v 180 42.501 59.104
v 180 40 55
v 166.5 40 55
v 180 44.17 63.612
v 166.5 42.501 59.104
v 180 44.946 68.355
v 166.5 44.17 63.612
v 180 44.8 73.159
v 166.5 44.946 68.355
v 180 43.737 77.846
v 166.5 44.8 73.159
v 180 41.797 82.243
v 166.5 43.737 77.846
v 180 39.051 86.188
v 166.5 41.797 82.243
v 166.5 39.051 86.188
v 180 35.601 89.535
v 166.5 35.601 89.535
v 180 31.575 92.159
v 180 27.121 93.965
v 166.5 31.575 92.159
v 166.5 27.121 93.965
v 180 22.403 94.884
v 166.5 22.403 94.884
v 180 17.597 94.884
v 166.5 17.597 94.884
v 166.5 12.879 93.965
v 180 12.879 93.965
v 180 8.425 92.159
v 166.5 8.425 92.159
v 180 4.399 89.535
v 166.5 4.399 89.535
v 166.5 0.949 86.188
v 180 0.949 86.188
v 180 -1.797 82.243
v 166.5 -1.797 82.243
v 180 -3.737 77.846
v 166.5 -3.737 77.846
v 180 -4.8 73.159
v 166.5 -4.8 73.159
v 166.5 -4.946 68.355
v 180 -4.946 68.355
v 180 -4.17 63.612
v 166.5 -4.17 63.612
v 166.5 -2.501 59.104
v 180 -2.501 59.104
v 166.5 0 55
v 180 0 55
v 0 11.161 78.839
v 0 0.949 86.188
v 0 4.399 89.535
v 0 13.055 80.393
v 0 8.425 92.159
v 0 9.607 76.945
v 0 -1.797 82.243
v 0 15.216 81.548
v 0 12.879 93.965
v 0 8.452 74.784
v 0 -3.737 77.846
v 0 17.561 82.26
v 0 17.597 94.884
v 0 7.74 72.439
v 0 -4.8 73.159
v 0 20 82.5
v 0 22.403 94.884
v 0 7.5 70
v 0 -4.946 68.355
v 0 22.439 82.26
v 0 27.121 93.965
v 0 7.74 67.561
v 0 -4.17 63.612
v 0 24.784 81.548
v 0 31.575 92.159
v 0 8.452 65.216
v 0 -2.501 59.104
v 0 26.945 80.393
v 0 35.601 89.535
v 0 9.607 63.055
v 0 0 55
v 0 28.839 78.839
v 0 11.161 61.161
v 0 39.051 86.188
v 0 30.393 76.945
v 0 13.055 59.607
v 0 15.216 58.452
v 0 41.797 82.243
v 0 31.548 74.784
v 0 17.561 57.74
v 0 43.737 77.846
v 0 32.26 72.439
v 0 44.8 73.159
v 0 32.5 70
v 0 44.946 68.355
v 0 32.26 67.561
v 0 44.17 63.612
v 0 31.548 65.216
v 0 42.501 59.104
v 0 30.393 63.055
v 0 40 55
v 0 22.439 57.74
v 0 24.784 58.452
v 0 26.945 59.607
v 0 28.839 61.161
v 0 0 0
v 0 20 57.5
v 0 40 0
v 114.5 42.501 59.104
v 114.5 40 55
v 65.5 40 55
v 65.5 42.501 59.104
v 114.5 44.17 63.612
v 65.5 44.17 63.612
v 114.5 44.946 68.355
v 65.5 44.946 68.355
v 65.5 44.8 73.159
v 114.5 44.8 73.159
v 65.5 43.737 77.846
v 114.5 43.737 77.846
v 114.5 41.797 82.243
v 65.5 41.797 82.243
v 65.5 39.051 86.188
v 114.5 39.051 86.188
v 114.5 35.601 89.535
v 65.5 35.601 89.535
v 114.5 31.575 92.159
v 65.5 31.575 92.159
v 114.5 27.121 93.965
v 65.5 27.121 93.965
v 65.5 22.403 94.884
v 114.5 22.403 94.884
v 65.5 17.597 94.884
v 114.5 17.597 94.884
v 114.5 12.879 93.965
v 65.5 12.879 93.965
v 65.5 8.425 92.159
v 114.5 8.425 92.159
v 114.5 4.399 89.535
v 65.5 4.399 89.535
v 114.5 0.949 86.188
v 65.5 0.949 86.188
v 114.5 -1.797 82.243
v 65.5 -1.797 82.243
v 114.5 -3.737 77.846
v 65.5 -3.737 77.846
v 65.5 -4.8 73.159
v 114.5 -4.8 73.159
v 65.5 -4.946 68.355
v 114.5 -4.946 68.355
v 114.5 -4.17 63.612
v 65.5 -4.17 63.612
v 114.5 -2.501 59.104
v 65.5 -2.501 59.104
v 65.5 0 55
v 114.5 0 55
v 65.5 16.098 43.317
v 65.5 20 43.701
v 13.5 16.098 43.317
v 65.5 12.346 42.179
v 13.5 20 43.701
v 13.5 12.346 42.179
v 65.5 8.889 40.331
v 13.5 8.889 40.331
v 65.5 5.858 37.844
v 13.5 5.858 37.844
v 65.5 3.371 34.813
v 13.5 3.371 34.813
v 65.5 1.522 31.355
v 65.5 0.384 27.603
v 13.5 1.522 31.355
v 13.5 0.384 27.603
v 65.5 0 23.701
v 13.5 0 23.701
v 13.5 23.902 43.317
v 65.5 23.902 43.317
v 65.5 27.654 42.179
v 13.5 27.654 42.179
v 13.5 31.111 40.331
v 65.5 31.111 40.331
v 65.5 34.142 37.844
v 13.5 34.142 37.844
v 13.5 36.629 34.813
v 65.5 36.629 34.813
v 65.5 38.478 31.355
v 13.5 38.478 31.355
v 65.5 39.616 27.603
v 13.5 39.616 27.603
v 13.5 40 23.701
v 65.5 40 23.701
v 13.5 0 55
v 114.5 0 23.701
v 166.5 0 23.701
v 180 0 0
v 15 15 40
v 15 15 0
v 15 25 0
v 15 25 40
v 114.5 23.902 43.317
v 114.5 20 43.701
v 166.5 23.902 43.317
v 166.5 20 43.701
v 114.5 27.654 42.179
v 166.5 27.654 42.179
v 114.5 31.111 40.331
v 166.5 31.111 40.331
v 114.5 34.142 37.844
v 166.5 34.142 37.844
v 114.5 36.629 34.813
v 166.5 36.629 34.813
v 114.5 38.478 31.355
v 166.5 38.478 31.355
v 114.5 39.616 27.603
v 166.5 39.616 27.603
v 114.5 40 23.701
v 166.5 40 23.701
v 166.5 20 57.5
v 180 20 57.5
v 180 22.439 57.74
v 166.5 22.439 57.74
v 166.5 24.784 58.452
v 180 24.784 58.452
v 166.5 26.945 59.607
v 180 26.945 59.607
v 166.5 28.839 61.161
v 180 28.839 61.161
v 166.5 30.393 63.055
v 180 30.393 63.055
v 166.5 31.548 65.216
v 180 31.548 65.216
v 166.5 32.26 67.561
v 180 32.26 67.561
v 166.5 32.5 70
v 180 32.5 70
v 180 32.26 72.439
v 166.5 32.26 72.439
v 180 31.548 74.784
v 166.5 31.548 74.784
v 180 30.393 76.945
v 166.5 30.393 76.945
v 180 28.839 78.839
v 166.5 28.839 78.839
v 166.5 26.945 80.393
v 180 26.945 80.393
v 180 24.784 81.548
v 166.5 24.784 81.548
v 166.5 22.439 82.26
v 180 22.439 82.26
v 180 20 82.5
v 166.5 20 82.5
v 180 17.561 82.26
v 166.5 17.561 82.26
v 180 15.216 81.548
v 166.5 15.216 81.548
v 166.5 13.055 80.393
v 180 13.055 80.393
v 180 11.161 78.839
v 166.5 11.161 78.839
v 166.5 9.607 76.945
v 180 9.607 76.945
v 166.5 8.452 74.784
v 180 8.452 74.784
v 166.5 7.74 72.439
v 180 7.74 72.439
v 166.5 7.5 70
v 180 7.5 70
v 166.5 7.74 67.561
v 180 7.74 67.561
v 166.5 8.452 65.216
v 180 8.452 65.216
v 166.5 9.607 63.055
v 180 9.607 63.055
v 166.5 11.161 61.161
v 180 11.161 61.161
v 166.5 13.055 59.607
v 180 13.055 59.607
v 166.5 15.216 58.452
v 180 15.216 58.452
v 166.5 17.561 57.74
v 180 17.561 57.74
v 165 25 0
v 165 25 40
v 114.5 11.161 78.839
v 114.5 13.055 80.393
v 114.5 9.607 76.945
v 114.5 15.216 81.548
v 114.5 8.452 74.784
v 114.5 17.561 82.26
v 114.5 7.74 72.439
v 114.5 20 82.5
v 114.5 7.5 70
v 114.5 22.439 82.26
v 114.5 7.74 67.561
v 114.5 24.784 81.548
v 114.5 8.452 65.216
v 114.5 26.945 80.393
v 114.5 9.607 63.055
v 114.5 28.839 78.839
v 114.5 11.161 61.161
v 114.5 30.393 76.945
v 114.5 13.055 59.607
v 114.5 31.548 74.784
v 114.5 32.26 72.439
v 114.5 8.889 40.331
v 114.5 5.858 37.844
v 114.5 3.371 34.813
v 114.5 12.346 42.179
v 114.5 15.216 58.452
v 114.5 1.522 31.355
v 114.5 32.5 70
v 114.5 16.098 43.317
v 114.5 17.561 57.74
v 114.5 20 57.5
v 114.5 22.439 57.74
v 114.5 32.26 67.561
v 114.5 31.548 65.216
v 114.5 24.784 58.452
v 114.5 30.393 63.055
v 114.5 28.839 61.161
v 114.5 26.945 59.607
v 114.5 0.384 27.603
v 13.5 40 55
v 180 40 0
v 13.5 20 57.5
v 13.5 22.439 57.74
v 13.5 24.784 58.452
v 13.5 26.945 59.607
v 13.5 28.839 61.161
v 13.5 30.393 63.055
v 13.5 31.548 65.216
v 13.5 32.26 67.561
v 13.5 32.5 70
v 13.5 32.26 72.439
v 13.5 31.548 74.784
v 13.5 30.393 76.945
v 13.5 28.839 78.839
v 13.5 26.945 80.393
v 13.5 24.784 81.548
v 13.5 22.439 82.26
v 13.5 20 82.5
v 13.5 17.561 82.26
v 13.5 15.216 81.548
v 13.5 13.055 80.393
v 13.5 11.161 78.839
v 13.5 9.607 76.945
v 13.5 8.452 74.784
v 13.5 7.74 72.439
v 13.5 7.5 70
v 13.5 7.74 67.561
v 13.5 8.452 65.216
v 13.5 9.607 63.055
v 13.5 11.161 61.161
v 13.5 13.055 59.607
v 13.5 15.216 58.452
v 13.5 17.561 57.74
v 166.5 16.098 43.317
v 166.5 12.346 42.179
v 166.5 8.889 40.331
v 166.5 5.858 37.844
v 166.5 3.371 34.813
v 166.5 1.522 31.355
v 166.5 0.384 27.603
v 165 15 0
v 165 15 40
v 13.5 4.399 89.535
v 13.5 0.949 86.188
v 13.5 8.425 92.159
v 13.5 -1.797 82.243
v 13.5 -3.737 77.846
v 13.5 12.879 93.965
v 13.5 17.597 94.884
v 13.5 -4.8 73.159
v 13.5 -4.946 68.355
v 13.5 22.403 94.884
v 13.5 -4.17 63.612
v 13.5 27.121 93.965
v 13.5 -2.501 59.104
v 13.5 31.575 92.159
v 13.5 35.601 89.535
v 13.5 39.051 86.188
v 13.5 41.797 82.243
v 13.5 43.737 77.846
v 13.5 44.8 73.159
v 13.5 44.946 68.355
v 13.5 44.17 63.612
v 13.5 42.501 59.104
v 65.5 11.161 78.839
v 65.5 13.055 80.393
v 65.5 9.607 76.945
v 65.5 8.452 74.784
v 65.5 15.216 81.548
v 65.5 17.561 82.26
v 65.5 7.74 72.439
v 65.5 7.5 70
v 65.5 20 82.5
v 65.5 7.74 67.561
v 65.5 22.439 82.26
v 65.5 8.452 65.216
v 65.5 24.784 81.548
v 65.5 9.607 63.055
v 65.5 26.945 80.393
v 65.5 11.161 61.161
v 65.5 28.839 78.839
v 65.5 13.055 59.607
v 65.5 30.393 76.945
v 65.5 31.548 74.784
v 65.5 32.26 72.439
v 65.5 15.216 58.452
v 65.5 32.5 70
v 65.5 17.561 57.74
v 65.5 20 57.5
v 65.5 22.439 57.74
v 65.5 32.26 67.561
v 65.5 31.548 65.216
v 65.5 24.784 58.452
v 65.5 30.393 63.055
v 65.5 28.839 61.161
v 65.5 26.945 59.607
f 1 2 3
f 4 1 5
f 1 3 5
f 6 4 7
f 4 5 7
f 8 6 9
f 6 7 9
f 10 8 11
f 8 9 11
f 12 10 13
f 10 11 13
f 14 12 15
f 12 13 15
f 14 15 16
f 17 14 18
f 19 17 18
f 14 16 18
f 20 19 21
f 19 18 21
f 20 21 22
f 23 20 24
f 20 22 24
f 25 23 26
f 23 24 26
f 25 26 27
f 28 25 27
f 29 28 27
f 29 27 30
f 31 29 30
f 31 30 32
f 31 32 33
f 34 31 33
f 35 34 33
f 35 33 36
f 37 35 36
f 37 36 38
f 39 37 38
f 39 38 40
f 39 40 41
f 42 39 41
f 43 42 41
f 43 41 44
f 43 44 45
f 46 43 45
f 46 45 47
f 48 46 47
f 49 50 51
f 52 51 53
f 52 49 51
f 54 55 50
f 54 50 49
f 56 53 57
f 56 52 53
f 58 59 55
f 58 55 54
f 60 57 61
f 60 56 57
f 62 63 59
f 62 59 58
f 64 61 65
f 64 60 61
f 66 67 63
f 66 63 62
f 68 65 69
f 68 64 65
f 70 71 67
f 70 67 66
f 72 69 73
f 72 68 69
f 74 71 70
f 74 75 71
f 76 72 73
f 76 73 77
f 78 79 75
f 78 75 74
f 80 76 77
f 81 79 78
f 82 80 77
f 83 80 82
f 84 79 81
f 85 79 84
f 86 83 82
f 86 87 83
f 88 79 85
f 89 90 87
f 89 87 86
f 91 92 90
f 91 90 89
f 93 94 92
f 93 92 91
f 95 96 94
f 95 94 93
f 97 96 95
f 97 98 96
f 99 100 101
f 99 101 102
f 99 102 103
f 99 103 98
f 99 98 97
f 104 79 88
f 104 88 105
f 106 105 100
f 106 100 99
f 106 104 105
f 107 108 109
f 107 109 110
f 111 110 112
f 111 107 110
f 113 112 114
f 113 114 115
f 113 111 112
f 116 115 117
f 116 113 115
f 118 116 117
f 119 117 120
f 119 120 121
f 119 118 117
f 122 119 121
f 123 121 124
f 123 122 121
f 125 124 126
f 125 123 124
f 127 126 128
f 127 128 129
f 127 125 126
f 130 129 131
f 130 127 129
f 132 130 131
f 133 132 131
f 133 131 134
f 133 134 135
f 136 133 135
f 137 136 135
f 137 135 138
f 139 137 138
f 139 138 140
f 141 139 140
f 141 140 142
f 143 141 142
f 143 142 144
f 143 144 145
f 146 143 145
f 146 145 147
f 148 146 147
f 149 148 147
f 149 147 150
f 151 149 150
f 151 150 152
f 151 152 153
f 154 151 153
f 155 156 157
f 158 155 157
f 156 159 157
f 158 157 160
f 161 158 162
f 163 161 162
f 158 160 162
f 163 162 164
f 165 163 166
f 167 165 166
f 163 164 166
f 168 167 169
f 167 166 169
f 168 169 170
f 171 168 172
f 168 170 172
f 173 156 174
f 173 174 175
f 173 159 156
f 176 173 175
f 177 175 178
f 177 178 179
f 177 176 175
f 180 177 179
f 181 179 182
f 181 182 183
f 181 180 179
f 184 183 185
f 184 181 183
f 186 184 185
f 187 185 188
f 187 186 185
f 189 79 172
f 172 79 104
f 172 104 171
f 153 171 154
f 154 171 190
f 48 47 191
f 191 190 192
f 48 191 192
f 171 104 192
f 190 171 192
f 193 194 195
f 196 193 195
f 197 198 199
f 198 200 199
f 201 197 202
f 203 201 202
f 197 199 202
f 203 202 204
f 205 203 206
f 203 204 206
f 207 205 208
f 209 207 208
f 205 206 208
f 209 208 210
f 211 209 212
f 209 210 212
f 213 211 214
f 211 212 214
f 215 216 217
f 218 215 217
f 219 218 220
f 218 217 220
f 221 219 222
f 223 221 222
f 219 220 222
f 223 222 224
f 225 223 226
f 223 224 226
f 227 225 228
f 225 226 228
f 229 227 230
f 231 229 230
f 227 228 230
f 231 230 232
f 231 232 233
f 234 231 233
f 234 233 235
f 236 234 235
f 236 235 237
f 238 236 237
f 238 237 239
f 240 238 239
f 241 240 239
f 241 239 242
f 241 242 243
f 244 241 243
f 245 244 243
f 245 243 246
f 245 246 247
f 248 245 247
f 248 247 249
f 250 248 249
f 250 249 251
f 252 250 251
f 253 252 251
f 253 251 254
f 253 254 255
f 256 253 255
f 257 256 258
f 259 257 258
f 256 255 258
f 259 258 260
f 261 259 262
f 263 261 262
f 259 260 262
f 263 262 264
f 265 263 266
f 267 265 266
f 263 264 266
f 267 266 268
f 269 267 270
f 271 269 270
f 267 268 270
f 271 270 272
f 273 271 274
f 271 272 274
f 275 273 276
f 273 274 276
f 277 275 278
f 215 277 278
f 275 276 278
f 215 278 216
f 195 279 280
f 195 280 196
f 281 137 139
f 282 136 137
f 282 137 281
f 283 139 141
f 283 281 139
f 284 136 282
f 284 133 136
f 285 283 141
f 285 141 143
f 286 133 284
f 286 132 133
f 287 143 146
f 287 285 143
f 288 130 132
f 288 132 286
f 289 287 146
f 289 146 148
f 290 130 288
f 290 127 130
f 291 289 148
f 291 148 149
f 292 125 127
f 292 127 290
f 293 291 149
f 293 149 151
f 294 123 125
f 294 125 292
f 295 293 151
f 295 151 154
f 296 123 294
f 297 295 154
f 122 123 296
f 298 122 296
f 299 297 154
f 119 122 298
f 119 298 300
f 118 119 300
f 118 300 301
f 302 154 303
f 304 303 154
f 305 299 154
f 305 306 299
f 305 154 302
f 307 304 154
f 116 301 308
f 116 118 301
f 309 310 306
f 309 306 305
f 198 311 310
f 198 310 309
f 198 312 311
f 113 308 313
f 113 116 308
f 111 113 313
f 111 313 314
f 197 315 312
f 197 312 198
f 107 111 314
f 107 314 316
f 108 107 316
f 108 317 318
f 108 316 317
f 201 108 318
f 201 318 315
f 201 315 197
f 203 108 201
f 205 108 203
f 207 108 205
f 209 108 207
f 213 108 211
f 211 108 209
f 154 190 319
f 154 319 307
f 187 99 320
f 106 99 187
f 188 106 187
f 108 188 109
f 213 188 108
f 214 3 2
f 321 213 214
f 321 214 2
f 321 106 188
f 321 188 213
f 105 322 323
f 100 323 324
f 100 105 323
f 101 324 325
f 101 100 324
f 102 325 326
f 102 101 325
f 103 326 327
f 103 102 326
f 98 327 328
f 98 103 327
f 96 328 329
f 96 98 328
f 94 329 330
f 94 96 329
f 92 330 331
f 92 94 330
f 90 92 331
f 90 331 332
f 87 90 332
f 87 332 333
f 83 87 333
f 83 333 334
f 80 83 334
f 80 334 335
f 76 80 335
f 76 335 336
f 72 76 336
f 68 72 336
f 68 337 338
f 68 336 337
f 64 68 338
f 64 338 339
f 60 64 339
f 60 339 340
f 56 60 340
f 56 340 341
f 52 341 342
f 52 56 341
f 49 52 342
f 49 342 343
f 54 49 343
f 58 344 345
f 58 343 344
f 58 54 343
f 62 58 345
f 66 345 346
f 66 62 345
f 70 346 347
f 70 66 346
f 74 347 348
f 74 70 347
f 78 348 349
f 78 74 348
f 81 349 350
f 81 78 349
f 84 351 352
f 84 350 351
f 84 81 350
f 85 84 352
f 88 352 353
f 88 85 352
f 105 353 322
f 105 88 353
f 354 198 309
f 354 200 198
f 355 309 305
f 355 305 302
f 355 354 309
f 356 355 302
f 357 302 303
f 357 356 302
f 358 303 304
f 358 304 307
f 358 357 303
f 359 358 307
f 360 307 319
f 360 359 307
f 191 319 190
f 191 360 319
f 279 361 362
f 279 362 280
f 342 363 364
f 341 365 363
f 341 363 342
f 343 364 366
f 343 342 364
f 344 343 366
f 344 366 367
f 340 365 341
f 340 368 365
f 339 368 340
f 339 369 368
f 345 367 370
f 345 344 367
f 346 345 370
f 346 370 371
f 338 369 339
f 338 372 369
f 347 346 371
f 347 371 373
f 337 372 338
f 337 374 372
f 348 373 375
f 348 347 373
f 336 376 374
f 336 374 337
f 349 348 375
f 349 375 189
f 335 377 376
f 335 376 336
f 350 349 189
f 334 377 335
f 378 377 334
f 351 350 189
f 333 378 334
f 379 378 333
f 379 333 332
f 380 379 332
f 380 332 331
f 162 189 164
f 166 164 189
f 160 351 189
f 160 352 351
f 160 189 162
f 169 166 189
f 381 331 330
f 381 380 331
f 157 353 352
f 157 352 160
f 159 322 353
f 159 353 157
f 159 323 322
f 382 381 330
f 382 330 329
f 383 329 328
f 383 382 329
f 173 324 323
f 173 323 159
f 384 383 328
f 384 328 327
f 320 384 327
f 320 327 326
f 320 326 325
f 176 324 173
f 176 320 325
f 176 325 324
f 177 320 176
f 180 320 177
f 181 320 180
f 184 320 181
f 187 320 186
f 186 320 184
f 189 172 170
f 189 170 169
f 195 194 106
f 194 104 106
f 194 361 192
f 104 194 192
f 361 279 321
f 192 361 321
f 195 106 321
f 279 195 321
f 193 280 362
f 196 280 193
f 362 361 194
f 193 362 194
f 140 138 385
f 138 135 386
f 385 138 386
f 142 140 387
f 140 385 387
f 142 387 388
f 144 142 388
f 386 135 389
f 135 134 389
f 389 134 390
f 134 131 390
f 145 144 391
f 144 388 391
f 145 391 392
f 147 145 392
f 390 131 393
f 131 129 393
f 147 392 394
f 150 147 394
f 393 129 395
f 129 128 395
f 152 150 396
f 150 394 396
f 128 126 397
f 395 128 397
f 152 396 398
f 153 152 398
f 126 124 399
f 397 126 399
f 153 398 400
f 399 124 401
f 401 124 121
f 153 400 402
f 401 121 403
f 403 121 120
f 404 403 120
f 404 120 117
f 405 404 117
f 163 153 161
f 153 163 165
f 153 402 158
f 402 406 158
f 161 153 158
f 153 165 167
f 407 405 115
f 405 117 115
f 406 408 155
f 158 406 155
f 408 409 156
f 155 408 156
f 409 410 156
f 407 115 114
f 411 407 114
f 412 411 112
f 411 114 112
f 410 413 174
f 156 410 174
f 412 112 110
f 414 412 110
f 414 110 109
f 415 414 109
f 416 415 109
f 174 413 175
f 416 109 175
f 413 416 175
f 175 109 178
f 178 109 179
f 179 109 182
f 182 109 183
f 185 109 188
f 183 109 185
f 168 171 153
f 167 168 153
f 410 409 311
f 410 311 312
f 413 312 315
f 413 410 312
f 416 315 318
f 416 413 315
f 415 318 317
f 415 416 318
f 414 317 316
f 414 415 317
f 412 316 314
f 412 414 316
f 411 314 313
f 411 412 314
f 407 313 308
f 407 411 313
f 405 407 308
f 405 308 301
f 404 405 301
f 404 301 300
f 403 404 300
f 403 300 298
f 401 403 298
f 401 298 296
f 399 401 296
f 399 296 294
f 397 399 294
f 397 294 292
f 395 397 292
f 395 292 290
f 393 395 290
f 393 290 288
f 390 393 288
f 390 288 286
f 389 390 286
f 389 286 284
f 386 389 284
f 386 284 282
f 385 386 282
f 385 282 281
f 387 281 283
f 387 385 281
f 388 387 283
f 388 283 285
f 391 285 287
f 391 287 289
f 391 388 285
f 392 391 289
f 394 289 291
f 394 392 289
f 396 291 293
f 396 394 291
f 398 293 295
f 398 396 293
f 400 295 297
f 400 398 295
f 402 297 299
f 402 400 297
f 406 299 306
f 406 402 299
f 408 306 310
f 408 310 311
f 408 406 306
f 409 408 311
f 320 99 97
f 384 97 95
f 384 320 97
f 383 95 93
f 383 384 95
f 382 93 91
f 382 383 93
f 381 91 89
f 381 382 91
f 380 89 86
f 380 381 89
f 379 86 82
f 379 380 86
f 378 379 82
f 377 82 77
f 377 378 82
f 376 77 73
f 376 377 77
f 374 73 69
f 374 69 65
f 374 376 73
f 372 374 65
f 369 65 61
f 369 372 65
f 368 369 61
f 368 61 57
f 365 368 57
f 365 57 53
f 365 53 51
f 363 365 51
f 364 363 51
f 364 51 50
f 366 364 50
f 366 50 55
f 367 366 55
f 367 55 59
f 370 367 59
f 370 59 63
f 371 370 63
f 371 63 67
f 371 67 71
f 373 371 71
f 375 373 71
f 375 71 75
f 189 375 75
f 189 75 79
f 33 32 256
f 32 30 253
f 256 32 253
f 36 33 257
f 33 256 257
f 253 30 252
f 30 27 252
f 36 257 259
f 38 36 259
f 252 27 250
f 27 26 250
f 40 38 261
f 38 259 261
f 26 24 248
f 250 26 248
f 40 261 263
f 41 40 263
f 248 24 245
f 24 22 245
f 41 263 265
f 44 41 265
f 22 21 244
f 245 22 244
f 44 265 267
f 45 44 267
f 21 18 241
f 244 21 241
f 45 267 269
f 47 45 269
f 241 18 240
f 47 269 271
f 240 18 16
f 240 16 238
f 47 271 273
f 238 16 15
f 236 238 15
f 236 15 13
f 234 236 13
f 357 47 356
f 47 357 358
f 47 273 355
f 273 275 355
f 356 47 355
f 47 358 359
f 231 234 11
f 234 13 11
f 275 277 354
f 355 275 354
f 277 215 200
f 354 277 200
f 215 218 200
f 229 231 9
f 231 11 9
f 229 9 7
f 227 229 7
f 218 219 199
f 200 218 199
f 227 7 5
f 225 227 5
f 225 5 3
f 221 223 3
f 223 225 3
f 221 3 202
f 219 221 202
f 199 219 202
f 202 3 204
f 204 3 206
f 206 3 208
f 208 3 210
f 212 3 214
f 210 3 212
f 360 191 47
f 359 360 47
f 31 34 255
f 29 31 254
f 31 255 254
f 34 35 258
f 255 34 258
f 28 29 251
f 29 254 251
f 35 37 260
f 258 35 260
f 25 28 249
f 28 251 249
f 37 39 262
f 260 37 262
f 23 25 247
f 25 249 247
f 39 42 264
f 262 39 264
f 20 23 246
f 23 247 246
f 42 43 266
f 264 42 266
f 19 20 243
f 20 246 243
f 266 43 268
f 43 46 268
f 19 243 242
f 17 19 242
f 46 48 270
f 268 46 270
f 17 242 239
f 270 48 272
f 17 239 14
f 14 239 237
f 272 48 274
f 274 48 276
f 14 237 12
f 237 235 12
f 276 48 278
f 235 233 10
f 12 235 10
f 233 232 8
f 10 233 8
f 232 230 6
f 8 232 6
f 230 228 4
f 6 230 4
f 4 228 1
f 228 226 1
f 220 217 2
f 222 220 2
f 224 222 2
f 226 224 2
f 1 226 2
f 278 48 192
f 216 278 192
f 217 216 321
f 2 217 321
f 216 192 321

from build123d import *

# Parameters (mm, degrees)
SKETCH1_W           = 180
SKETCH1_H           = 40
BOSS_EXTRUDE1_DEPTH = 56
SKETCH2_W           = 150
SKETCH2_H           = 10
CUT_EXTRUDE1_DEPTH  = 40
SKETCH3_R           = 25
BOSS_EXTRUDE2_DEPTH = 24.5
BOSS_EXTRUDE3_START = -13.5
SKETCH4_R           = 25
BOSS_EXTRUDE3_DEPTH = 13.5
SKETCH6_R           = 12.5
CUT_EXTRUDE2_DEPTH  = 90
SKETCH10_W          = 11.29862099
SKETCH10_H          = 40
CUT_EXTRUDE4_DEPTH  = 52
SKETCH11_W          = 52
SKETCH11_H          = 40
CUT_EXTRUDE5_DEPTH  = 2
FILLET1_R           = 20


with BuildPart() as part:
    # Sketch1 → Boss-Extrude1 (new body)
    with BuildSketch(Plane.XY):
        with Locations((90, 20)):
            Rectangle(SKETCH1_W, SKETCH1_H)
    extrude(amount=BOSS_EXTRUDE1_DEPTH)

    # Sketch2 → Cut-Extrude1 (cut)
    with BuildSketch(Plane(origin=(0, 0, 0), x_dir=(-1, 0, 0), z_dir=(0, 0, -1))):
        with Locations((-90, 20)):
            Rectangle(SKETCH2_W, SKETCH2_H)
    extrude(amount=-CUT_EXTRUDE1_DEPTH, mode=Mode.SUBTRACT)

    # Sketch3 → Boss-Extrude2 (add)
    with BuildSketch(Plane(origin=(90, 0, 0), x_dir=(0, 0, -1), z_dir=(1, 0, 0))):
        with Locations((-70, 20)):
            Circle(SKETCH3_R)
    boss_extrude2 = extrude(amount=BOSS_EXTRUDE2_DEPTH)

    # Sketch4 → Boss-Extrude3 (add)
    with BuildSketch(Plane(origin=(180, 0, 0), x_dir=(0, 0, -1), z_dir=(1, 0, 0)).offset(BOSS_EXTRUDE3_START)):
        with Locations((-70, 20)):
            Circle(SKETCH4_R)
    boss_extrude3 = extrude(amount=BOSS_EXTRUDE3_DEPTH)

    # Sketch6 → Cut-Extrude2 (cut)
    with BuildSketch(Plane(origin=(180, 0, 0), x_dir=(0, 0, -1), z_dir=(1, 0, 0))):
        with Locations((-70, 20)):
            Circle(SKETCH6_R)
    cut_extrude2 = extrude(amount=-CUT_EXTRUDE2_DEPTH, mode=Mode.SUBTRACT)

    # Mirror1: Boss-Extrude2, Boss-Extrude3, Cut-Extrude2 across plane
    add(boss_extrude2.mirror(Plane(origin=(90, 0, 0), x_dir=(0, 0, 1), z_dir=(1, 0, 0))))
    add(boss_extrude3.mirror(Plane(origin=(90, 0, 0), x_dir=(0, 0, 1), z_dir=(1, 0, 0))))
    add(cut_extrude2.mirror(Plane(origin=(90, 0, 0), x_dir=(0, 0, 1), z_dir=(1, 0, 0))), mode=Mode.SUBTRACT)

    # Sketch10 → Cut-Extrude4 (cut)
    with BuildSketch(Plane(origin=(114.5, 0, 0), x_dir=(0, 0, -1), z_dir=(1, 0, 0))):
        with Locations((-49.350689505, 20)):
            Rectangle(SKETCH10_W, SKETCH10_H)
    cut_extrude4 = extrude(amount=CUT_EXTRUDE4_DEPTH, mode=Mode.SUBTRACT)

    # Mirror3: Cut-Extrude4 across plane
    add(cut_extrude4.mirror(Plane(origin=(90, 0, 0), x_dir=(0, 0, 1), z_dir=(1, 0, 0))), mode=Mode.SUBTRACT)

    # Sketch11 → Cut-Extrude5 (cut)
    with BuildSketch(Plane.XY.offset(56)):
        with Locations((140.5, 20)):
            Rectangle(SKETCH11_W, SKETCH11_H)
    cut_extrude5 = extrude(amount=-CUT_EXTRUDE5_DEPTH, mode=Mode.SUBTRACT)

    # Mirror4: Cut-Extrude5 across plane
    add(cut_extrude5.mirror(Plane(origin=(90, 0, 0), x_dir=(0, 0, 1), z_dir=(1, 0, 0))), mode=Mode.SUBTRACT)

    # Fillet1
    fillet1_edges = [part.edges().sort_by_distance(p)[0] for p in [
        (39.5, 40, 43.70137901),
        (39.5, 0, 43.70137901),
        (140.5, 40, 43.70137901),
        (140.5, 0, 43.70137901),
    ]]
    fillet(fillet1_edges, radius=FILLET1_R - 0.0001)  # a hair under: the kernel refuses the full size


solid = part.part
